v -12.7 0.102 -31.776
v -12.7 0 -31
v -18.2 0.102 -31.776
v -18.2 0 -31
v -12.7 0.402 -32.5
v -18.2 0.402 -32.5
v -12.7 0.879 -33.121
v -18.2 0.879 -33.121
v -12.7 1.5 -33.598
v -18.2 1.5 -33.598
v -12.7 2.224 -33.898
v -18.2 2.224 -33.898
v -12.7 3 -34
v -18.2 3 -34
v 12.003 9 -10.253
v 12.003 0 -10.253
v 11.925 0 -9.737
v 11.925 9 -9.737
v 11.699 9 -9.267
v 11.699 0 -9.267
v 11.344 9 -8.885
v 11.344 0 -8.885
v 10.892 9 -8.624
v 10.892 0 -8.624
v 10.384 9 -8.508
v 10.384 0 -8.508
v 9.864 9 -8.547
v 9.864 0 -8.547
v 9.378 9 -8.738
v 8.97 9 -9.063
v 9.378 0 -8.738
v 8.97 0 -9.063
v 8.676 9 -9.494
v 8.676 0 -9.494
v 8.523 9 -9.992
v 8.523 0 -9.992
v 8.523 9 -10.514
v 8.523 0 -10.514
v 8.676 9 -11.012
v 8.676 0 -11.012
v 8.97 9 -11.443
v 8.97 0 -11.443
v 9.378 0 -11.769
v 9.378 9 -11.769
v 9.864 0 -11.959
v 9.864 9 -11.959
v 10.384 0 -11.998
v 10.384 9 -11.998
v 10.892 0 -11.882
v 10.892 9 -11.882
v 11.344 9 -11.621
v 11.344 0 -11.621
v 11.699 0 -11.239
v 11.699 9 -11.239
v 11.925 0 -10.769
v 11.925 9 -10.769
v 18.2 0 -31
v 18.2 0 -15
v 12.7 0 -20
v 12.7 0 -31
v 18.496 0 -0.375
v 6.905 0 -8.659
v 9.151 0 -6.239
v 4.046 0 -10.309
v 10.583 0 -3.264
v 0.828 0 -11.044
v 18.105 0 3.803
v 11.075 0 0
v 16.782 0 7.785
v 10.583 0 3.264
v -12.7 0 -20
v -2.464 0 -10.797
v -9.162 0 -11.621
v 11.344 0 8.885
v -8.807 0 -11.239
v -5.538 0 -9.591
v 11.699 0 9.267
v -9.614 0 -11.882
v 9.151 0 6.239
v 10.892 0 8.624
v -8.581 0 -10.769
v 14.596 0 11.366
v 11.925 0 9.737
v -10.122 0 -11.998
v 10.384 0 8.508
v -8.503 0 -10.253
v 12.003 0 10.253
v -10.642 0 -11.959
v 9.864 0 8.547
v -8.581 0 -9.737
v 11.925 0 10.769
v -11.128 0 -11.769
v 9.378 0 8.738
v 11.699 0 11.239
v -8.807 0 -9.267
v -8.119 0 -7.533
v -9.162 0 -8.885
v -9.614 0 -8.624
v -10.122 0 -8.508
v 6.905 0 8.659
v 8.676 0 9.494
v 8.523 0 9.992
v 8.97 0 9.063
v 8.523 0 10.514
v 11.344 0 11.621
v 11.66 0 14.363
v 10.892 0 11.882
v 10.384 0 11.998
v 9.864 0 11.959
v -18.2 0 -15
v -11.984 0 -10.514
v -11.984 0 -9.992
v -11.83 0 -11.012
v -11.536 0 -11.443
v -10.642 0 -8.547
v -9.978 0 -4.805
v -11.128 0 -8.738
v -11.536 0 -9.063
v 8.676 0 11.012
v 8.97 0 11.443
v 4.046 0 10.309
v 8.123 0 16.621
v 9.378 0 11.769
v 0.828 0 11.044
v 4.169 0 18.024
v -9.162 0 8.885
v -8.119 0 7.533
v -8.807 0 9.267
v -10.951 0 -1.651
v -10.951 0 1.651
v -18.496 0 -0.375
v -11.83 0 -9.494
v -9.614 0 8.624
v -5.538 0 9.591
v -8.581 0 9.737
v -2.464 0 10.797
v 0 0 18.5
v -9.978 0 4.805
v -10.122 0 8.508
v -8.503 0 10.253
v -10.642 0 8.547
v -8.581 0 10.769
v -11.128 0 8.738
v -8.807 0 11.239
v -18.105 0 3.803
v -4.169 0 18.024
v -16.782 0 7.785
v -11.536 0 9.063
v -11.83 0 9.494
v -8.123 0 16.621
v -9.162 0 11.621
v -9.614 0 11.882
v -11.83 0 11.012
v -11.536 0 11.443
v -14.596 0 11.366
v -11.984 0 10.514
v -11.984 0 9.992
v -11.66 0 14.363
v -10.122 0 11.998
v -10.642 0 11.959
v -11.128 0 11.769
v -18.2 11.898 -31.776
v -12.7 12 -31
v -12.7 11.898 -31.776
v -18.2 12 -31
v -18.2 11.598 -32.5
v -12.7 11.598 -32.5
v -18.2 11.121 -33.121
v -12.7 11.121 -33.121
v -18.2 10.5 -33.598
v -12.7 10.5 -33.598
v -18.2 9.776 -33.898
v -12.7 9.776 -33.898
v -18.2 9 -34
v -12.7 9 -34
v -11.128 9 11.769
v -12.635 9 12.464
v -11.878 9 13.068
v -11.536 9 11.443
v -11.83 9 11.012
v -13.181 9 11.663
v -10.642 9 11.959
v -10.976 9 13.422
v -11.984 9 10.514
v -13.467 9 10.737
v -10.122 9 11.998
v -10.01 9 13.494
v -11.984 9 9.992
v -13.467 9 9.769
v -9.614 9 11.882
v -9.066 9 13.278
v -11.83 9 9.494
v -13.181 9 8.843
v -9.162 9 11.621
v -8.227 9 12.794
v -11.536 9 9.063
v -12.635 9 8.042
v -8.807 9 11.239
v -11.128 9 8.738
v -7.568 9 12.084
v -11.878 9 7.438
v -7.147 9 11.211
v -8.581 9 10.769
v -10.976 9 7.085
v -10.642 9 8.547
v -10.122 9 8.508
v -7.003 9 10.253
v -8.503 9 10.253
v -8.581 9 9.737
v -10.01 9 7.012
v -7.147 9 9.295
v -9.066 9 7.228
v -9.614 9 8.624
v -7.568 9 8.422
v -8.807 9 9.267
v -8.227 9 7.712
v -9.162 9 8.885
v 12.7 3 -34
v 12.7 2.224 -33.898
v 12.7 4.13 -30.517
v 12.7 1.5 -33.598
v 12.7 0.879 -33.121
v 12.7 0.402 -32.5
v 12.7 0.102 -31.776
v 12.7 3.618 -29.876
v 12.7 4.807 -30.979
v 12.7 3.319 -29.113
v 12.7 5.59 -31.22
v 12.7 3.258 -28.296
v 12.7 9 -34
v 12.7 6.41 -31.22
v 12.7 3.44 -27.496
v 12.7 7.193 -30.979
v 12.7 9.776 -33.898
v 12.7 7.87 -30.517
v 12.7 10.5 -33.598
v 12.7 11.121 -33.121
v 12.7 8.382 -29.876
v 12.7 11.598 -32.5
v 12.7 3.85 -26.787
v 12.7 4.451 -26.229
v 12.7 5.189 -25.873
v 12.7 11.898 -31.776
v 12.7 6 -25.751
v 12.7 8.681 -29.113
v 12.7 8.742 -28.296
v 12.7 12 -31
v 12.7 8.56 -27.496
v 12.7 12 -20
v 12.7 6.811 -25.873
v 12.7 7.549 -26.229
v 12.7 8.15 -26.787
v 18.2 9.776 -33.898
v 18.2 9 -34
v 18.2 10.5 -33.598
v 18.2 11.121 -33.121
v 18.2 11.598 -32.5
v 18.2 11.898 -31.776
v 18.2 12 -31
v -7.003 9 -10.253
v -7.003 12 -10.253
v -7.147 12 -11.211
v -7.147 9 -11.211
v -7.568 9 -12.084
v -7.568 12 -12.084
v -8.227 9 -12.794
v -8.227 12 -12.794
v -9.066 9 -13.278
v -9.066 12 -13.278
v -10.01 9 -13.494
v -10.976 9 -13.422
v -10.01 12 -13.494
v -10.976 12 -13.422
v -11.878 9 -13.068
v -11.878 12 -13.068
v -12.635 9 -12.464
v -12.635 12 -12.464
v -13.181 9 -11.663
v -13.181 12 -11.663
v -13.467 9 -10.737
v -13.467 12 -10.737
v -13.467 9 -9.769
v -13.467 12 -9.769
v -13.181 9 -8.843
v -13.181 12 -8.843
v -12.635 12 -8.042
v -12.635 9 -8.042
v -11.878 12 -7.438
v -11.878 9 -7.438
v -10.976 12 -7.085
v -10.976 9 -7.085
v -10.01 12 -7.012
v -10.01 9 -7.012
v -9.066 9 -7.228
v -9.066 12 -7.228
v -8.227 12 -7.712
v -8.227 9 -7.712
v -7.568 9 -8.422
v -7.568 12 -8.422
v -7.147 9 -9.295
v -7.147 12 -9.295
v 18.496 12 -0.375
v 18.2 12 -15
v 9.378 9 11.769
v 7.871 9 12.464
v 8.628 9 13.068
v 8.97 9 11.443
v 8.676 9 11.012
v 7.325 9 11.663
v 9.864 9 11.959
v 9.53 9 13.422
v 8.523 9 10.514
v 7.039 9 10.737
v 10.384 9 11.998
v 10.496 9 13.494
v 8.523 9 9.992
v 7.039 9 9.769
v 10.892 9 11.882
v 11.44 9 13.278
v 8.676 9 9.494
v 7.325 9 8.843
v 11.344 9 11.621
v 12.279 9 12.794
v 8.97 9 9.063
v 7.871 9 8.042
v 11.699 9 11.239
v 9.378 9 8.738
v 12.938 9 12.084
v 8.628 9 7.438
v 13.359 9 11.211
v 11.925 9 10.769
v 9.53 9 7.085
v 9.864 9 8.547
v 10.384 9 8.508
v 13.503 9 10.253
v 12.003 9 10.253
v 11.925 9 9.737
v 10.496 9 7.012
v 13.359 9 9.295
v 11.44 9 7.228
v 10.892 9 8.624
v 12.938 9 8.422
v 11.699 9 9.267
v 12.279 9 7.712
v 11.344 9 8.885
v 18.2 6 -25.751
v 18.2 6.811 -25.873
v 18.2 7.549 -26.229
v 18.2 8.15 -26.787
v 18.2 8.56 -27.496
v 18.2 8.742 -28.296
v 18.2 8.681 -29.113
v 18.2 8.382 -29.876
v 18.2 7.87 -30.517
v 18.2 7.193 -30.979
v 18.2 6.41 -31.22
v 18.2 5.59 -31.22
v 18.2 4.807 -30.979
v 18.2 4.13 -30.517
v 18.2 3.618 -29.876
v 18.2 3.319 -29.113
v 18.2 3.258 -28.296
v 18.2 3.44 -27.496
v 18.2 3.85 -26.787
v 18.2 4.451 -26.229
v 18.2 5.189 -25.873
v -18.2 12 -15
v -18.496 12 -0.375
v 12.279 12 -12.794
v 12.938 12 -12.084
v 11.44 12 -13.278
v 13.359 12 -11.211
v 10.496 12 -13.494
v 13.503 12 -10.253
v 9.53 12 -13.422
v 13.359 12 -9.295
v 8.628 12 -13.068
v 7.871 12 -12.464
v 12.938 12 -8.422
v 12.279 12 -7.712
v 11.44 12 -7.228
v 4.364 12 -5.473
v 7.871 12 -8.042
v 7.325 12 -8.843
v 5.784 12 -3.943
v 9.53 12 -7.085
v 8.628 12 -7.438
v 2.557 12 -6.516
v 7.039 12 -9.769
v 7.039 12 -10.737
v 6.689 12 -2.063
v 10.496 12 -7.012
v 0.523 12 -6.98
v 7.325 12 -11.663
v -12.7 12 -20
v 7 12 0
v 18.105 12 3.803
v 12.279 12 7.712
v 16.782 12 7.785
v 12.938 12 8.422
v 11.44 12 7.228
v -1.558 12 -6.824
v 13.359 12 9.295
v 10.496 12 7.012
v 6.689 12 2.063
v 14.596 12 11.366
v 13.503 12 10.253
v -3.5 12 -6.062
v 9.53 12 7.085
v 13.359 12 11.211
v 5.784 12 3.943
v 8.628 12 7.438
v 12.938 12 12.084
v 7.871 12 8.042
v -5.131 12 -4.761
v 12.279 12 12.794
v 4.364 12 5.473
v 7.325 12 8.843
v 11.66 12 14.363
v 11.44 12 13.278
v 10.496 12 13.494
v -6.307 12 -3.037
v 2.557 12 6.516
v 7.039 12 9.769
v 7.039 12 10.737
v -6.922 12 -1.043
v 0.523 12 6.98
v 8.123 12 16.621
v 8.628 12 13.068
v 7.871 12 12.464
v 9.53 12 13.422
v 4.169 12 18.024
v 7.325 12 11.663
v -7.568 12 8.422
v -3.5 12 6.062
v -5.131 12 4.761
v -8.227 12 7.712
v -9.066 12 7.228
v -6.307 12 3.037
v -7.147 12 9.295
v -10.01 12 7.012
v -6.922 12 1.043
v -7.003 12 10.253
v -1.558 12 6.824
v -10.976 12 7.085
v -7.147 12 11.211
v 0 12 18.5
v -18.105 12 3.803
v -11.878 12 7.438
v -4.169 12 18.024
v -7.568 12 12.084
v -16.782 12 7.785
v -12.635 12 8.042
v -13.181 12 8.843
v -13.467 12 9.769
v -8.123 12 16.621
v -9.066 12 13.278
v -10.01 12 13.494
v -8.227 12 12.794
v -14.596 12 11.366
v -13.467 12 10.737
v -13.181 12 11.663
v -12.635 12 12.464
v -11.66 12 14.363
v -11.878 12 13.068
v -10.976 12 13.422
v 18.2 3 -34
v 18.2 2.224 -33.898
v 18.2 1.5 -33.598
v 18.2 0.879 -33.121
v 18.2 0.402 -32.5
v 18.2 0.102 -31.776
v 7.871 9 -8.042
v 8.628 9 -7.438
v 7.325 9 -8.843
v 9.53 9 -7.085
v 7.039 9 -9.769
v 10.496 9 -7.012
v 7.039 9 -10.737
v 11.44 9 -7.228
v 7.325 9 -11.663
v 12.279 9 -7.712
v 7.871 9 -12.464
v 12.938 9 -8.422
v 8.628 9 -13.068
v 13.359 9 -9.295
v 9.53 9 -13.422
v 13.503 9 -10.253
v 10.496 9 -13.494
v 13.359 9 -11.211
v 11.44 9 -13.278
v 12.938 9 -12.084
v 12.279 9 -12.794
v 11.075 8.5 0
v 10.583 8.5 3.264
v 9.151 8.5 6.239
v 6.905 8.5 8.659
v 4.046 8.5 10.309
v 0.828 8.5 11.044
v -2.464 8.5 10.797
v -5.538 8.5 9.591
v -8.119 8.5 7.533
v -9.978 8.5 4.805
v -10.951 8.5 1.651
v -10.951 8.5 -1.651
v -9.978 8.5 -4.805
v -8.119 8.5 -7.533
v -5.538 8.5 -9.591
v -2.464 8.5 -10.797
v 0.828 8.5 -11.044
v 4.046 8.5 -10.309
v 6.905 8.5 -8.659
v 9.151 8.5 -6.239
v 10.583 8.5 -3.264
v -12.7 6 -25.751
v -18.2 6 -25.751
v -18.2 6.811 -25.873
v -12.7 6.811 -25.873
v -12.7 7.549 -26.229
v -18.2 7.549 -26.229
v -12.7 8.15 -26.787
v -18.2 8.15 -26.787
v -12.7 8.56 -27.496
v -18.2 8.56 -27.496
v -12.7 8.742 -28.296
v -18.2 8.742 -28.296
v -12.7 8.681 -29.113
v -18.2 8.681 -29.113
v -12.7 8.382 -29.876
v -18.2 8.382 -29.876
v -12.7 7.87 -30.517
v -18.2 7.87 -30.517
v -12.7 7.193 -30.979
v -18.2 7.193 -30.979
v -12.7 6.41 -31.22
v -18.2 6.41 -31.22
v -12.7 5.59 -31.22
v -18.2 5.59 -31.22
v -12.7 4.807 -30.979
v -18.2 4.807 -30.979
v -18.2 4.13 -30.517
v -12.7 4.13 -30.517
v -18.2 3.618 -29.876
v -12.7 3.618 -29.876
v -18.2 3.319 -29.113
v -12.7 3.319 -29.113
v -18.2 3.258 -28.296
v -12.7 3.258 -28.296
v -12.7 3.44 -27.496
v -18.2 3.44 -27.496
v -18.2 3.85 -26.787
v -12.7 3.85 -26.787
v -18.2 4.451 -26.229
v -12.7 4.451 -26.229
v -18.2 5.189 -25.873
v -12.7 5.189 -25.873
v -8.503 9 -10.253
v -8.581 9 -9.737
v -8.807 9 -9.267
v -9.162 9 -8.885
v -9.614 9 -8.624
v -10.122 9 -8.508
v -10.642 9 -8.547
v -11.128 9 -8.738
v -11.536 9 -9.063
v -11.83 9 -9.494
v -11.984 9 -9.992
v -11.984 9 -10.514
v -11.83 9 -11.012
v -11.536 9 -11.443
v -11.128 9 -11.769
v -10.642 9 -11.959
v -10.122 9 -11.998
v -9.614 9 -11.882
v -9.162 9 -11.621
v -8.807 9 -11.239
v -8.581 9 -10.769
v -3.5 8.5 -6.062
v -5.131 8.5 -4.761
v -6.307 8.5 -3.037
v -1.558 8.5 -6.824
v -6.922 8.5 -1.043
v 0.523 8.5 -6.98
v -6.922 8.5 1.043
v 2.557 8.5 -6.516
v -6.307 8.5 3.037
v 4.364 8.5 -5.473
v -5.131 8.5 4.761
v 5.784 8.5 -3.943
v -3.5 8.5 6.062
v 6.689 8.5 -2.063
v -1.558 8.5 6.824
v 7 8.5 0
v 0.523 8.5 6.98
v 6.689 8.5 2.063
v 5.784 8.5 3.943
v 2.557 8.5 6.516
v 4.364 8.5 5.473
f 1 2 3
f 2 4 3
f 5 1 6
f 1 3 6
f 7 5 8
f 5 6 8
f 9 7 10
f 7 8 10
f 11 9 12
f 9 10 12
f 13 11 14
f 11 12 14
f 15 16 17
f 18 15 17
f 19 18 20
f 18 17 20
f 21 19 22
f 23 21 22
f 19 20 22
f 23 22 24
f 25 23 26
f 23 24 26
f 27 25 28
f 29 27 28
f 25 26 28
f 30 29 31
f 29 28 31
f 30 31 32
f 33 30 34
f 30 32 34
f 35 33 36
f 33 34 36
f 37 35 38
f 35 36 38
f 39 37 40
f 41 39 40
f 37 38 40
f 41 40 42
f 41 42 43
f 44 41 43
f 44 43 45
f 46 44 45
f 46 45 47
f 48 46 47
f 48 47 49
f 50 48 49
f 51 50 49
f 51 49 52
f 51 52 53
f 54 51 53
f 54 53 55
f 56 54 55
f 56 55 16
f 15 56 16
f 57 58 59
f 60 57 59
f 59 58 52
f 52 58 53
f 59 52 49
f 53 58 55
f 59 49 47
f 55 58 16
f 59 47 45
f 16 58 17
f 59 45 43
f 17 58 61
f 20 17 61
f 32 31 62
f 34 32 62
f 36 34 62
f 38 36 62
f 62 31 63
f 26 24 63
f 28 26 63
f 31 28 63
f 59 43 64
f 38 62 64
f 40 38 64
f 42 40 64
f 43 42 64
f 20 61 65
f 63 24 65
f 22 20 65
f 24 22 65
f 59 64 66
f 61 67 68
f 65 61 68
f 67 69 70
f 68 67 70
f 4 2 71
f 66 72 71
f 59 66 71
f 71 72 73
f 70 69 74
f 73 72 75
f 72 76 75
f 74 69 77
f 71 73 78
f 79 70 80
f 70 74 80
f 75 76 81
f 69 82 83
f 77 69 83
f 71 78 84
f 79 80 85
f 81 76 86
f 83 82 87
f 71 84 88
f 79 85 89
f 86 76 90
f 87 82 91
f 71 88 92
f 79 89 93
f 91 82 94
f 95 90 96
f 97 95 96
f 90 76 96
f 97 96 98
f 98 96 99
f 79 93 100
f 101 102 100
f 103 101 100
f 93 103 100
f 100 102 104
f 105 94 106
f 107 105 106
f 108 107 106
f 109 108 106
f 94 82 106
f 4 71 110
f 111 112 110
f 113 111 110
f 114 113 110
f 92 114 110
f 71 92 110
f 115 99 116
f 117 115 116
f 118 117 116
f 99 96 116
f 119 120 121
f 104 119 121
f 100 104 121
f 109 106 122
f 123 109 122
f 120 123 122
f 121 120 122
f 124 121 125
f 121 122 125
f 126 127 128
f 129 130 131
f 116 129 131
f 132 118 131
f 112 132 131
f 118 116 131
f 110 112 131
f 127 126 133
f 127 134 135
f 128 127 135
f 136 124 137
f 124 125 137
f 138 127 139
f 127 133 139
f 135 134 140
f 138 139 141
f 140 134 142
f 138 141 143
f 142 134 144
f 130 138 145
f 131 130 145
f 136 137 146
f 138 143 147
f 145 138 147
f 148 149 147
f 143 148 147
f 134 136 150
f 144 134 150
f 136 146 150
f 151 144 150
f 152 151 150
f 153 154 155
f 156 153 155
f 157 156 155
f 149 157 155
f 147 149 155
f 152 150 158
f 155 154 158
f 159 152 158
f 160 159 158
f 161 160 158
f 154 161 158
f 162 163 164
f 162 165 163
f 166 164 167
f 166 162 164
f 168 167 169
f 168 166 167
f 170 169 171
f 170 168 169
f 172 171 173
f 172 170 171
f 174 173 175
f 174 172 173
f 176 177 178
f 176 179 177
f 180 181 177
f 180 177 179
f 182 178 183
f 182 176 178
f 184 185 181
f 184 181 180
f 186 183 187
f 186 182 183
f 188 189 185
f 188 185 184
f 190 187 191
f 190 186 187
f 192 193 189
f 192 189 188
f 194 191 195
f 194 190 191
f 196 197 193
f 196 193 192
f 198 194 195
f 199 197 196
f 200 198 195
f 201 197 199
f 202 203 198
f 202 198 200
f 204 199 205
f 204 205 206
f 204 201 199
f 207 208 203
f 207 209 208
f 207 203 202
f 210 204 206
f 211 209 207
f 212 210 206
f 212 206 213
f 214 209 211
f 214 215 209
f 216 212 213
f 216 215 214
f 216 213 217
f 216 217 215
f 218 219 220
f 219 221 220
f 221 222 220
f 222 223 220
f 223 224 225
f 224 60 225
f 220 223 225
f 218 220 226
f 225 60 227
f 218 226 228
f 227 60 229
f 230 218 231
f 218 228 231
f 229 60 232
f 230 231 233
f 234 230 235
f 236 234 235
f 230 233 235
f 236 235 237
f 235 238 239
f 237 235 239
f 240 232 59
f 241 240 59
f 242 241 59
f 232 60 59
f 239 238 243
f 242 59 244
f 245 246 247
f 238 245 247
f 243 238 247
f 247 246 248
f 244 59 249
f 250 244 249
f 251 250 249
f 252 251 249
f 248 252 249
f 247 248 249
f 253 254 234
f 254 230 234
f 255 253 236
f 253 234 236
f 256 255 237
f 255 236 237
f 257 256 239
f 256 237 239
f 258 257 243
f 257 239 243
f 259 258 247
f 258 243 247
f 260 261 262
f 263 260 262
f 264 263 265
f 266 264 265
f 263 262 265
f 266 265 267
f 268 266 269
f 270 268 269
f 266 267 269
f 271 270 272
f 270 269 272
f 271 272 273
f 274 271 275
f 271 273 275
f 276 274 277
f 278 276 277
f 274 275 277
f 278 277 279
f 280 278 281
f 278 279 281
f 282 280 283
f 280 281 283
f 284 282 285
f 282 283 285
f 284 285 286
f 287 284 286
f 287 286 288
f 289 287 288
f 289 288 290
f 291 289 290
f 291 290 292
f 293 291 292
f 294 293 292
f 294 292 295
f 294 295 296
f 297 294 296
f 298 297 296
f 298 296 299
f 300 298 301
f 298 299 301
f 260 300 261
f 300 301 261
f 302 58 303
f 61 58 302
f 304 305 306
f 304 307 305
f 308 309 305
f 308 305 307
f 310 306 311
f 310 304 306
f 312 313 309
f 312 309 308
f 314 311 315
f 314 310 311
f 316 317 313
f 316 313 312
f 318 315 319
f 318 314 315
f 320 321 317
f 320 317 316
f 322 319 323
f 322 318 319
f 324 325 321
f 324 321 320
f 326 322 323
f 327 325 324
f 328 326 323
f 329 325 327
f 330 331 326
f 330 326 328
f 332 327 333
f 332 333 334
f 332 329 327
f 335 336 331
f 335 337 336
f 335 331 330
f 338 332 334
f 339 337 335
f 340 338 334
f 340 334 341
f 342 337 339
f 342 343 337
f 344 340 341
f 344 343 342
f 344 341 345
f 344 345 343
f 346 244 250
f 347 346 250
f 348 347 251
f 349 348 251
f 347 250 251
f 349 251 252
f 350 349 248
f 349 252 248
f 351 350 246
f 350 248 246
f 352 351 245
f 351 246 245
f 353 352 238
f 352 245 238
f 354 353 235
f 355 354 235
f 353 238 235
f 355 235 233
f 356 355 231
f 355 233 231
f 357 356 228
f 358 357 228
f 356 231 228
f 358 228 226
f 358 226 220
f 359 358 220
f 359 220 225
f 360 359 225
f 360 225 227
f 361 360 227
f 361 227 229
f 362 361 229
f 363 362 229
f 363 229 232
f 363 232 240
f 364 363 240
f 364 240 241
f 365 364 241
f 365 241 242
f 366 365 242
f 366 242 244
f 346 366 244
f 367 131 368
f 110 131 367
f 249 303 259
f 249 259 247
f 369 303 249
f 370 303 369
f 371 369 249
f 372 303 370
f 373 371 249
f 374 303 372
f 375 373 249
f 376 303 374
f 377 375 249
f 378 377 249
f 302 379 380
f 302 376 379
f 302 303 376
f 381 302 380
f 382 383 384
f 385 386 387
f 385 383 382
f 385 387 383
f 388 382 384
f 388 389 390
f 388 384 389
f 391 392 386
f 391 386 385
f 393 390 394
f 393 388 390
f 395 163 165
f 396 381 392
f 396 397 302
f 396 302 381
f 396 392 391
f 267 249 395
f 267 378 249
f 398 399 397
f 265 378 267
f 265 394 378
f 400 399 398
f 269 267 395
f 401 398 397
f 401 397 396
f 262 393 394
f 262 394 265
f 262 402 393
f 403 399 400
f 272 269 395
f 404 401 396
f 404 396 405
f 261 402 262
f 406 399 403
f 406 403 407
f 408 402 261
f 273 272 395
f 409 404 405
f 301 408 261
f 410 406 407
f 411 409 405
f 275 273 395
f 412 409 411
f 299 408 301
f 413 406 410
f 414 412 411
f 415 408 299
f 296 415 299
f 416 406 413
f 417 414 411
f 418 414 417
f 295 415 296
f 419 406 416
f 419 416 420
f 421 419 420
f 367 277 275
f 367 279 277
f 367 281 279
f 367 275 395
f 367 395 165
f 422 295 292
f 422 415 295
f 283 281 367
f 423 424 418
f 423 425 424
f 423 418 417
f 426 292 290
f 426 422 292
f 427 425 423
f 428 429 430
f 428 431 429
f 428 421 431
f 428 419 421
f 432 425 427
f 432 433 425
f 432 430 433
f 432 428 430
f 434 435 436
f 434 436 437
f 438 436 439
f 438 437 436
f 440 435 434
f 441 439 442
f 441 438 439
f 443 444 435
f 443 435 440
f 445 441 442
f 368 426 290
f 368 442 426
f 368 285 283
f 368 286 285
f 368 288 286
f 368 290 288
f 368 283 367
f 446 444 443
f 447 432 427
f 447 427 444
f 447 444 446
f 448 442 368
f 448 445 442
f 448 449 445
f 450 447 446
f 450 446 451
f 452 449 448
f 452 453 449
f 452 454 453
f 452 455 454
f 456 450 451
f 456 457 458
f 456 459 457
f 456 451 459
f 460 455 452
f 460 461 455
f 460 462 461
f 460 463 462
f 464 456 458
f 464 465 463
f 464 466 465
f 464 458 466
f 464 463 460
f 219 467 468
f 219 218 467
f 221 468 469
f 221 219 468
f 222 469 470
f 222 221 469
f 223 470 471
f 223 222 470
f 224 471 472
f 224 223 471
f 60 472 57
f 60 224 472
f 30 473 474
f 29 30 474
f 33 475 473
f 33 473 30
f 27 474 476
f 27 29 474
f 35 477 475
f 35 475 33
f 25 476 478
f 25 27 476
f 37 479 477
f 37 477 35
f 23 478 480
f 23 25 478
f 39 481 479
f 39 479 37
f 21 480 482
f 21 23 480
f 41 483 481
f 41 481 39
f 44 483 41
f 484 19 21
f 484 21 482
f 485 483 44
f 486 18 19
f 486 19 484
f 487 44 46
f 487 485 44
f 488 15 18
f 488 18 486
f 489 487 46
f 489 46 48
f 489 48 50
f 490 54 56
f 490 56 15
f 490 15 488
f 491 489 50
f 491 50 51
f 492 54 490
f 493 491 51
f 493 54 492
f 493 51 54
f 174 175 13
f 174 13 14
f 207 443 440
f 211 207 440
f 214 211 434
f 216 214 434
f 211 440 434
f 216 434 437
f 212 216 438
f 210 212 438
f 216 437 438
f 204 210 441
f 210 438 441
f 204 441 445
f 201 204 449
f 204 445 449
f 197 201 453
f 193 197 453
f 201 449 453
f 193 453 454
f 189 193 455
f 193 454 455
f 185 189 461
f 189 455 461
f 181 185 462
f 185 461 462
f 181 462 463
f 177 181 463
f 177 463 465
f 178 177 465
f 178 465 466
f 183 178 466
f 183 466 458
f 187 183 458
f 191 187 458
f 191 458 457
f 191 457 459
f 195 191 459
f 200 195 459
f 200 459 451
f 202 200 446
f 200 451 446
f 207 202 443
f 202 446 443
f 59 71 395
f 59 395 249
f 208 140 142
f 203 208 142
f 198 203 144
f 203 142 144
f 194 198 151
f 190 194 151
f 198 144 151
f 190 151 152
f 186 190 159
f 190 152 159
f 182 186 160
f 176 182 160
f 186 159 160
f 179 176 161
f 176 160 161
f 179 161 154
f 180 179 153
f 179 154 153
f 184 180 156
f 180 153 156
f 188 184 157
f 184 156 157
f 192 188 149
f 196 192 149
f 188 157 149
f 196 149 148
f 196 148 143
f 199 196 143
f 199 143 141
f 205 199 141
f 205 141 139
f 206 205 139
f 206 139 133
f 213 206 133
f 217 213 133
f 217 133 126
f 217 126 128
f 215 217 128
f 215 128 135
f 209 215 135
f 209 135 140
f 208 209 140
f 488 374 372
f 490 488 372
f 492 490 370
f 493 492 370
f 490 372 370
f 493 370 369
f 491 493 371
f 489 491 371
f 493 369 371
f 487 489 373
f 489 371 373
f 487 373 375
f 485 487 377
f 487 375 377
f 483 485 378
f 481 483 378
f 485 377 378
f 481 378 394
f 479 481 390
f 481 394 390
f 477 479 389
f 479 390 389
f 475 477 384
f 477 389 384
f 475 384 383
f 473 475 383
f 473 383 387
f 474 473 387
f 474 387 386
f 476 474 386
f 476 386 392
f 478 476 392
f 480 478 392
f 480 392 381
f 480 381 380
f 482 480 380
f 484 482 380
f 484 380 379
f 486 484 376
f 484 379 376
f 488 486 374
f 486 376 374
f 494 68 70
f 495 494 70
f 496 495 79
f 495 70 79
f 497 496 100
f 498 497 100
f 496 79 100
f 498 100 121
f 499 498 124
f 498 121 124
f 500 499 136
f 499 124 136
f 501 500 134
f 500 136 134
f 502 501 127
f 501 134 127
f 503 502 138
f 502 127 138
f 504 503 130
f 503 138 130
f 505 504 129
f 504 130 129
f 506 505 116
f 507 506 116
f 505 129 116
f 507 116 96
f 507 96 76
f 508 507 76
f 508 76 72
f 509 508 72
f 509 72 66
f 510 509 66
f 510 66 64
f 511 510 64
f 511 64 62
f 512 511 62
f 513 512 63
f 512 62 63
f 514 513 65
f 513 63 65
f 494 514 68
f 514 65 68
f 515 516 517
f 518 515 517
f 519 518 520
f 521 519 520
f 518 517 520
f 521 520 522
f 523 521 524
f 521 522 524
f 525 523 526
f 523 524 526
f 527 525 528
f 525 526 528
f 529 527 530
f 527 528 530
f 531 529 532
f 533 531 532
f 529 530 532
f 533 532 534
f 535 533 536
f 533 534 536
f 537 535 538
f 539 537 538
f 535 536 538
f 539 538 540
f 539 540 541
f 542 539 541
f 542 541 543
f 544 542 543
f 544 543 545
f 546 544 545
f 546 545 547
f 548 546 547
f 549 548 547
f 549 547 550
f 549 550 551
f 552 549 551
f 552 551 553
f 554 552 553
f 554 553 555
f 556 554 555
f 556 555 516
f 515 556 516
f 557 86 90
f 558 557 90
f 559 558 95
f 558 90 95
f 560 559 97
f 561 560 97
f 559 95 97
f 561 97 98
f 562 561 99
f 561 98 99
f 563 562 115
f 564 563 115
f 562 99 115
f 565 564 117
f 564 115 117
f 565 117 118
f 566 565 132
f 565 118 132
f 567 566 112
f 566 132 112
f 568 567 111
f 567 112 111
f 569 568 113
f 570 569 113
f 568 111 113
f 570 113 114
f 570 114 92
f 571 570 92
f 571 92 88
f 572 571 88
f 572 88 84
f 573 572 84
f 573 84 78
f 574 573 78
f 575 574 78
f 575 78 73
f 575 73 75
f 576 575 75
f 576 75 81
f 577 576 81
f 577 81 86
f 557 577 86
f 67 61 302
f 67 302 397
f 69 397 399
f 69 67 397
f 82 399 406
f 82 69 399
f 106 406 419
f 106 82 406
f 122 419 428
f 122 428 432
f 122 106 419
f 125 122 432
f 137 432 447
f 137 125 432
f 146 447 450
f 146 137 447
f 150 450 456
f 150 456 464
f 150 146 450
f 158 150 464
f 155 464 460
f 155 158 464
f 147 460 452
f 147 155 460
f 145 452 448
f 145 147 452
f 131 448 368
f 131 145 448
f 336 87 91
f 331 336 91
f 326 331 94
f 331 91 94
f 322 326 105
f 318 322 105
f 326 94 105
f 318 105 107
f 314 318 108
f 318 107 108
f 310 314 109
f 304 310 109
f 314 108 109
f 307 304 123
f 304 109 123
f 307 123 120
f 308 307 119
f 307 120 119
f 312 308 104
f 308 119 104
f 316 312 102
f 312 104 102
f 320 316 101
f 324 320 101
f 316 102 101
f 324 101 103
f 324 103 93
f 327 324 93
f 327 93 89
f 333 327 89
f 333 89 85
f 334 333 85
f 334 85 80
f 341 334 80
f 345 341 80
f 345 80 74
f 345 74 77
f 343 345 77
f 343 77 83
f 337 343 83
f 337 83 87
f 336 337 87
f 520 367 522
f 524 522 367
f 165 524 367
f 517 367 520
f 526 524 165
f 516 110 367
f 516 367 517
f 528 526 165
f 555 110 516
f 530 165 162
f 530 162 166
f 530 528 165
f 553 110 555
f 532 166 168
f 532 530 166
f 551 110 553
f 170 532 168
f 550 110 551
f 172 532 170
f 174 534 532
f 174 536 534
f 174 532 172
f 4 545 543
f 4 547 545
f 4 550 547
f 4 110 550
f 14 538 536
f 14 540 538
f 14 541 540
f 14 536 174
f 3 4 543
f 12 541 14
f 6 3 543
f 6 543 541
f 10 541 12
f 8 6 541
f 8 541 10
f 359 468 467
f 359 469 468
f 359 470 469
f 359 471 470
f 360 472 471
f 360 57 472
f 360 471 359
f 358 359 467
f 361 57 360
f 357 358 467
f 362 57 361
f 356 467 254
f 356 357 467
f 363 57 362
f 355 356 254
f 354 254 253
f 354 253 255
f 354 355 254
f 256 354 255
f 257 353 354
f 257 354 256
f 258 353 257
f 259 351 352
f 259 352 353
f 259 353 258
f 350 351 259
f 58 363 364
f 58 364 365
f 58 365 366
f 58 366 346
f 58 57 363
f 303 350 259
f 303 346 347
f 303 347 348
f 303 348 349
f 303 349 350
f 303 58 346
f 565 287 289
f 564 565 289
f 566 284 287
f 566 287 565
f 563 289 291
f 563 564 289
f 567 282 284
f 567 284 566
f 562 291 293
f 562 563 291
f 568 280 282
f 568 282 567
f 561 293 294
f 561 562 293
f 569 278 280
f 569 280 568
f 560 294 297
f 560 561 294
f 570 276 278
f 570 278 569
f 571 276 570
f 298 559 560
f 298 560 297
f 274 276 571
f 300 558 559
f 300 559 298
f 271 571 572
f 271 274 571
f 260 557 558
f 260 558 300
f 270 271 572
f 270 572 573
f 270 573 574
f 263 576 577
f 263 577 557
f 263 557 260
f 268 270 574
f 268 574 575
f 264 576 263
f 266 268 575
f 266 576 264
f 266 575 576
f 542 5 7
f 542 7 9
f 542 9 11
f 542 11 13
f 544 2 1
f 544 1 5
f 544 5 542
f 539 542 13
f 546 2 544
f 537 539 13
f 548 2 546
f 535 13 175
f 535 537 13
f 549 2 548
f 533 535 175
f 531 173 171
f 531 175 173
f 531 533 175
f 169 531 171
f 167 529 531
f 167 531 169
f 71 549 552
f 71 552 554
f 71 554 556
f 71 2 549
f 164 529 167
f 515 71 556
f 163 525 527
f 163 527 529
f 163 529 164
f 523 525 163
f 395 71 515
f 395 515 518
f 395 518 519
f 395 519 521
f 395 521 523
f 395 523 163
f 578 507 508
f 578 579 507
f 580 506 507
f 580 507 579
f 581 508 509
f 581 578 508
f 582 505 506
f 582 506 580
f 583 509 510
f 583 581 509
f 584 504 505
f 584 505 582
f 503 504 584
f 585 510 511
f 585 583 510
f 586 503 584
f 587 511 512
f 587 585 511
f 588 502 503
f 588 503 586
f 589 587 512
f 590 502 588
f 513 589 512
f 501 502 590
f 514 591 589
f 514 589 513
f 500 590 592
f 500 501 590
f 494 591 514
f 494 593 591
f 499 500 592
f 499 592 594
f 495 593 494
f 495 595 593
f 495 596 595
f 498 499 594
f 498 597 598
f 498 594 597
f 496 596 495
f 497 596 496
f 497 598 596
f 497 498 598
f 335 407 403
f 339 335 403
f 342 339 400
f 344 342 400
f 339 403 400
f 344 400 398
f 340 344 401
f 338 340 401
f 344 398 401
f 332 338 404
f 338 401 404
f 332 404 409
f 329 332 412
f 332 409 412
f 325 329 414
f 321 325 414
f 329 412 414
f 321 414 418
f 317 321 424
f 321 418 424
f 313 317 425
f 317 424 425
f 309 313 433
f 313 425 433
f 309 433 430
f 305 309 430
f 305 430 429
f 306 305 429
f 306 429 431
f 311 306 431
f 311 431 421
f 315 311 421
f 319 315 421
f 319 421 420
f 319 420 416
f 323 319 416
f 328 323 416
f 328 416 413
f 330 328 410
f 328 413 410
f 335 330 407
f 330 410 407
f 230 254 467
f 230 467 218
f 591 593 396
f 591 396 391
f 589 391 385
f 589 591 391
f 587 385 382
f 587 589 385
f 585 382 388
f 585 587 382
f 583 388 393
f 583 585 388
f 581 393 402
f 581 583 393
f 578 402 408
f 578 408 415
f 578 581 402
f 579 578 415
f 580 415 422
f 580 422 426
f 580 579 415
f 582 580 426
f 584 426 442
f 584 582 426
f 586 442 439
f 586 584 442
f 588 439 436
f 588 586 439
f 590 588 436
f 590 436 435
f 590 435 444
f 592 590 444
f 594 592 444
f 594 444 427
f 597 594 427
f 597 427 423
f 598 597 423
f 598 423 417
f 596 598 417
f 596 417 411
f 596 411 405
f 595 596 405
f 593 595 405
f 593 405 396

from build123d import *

# Parameters (mm, degrees)
SKETCH1_R           = 7
BOSS_EXTRUDE1_DEPTH = 12
SKETCH2_R           = 11.075
CUT_EXTRUDE1_DEPTH  = 8.5
SKETCH4_R           = 1.75
CUT_EXTRUDE4_DEPTH  = 13
SKETCH5_R           = 3.25
CUT_EXTRUDE5_DEPTH  = 3
SKETCH6_W           = 5.5
SKETCH6_H           = 12
BOSS_EXTRUDE2_DEPTH = 14
SKETCH7_R           = 2.75
CUT_EXTRUDE6_DEPTH  = 37.7
FILLET1_R           = 3


with BuildPart() as part:
    # Sketch1 → Boss-Extrude1 (new body)
    with BuildSketch(Plane(origin=(0, 0, 0), x_dir=(1, 0, 0), z_dir=(0, 1, 0))):
        with BuildLine():
            Line((-18.2, 15), (-18.2, 20))
            Line((-18.2, 20), (18.2, 20))
            Line((18.2, 20), (18.2, 15))
            Line((18.2, 15), (18.496206995, 0.374602179))
            ThreePointArc((18.496206995, 0.374602179), (0, -18.5), (-18.496206995, 0.374602179))
            Line((-18.496206995, 0.374602179), (-18.2, 15))
        make_face()
        Circle(SKETCH1_R, mode=Mode.SUBTRACT)
    extrude(amount=BOSS_EXTRUDE1_DEPTH)

    # Sketch2 → Cut-Extrude1 (cut)
    with BuildSketch(Plane.XZ):
        Circle(SKETCH2_R)
    extrude(amount=-CUT_EXTRUDE1_DEPTH, mode=Mode.SUBTRACT)

    # Sketch4 → Cut-Extrude4 (cut, through all)
    with BuildSketch(Plane.XZ):
        with Locations((10.253048327, 10.253048327)):
            Circle(SKETCH4_R)
        with Locations((10.253048327, -10.253048327)):
            Circle(SKETCH4_R)
        with Locations((-10.253048327, -10.253048327)):
            Circle(SKETCH4_R)
        with Locations((-10.253048327, 10.253048327)):
            Circle(SKETCH4_R)
    extrude(amount=-CUT_EXTRUDE4_DEPTH, mode=Mode.SUBTRACT)

    # Sketch5 → Cut-Extrude5 (cut)
    with BuildSketch(Plane(origin=(0, 12, 0), x_dir=(1, 0, 0), z_dir=(0, 1, 0))):
        with Locations((-10.253048327, 10.253048327)):
            Circle(SKETCH5_R)
        with Locations((10.253048327, 10.253048327)):
            Circle(SKETCH5_R)
        with Locations((10.253048327, -10.253048327)):
            Circle(SKETCH5_R)
        with Locations((-10.253048327, -10.253048327)):
            Circle(SKETCH5_R)
    extrude(amount=-CUT_EXTRUDE5_DEPTH, mode=Mode.SUBTRACT)

    # Sketch6 → Boss-Extrude2 (add)
    with BuildSketch(Plane(origin=(0, 0, -20), x_dir=(-1, 0, 0), z_dir=(0, 0, -1))):
        with Locations((-15.45, 6)):
            Rectangle(SKETCH6_W, SKETCH6_H)
        with Locations((15.45, 6)):
            Rectangle(SKETCH6_W, SKETCH6_H)
    extrude(amount=BOSS_EXTRUDE2_DEPTH)

    # Sketch7 → Cut-Extrude6 (cut, through all)
    with BuildSketch(Plane.ZY.offset(18.2)):
        with Locations((-28.501137854, 6)):
            Circle(SKETCH7_R)
    extrude(amount=-CUT_EXTRUDE6_DEPTH, mode=Mode.SUBTRACT)

    # Fillet1
    fillet1_edges = [part.edges().sort_by_distance(p)[0] for p in [
        (15.45, 0, -34),
        (15.45, 12, -34),
        (-15.45, 0, -34),
        (-15.45, 12, -34),
    ]]
    fillet(fillet1_edges, radius=FILLET1_R)


solid = part.part
